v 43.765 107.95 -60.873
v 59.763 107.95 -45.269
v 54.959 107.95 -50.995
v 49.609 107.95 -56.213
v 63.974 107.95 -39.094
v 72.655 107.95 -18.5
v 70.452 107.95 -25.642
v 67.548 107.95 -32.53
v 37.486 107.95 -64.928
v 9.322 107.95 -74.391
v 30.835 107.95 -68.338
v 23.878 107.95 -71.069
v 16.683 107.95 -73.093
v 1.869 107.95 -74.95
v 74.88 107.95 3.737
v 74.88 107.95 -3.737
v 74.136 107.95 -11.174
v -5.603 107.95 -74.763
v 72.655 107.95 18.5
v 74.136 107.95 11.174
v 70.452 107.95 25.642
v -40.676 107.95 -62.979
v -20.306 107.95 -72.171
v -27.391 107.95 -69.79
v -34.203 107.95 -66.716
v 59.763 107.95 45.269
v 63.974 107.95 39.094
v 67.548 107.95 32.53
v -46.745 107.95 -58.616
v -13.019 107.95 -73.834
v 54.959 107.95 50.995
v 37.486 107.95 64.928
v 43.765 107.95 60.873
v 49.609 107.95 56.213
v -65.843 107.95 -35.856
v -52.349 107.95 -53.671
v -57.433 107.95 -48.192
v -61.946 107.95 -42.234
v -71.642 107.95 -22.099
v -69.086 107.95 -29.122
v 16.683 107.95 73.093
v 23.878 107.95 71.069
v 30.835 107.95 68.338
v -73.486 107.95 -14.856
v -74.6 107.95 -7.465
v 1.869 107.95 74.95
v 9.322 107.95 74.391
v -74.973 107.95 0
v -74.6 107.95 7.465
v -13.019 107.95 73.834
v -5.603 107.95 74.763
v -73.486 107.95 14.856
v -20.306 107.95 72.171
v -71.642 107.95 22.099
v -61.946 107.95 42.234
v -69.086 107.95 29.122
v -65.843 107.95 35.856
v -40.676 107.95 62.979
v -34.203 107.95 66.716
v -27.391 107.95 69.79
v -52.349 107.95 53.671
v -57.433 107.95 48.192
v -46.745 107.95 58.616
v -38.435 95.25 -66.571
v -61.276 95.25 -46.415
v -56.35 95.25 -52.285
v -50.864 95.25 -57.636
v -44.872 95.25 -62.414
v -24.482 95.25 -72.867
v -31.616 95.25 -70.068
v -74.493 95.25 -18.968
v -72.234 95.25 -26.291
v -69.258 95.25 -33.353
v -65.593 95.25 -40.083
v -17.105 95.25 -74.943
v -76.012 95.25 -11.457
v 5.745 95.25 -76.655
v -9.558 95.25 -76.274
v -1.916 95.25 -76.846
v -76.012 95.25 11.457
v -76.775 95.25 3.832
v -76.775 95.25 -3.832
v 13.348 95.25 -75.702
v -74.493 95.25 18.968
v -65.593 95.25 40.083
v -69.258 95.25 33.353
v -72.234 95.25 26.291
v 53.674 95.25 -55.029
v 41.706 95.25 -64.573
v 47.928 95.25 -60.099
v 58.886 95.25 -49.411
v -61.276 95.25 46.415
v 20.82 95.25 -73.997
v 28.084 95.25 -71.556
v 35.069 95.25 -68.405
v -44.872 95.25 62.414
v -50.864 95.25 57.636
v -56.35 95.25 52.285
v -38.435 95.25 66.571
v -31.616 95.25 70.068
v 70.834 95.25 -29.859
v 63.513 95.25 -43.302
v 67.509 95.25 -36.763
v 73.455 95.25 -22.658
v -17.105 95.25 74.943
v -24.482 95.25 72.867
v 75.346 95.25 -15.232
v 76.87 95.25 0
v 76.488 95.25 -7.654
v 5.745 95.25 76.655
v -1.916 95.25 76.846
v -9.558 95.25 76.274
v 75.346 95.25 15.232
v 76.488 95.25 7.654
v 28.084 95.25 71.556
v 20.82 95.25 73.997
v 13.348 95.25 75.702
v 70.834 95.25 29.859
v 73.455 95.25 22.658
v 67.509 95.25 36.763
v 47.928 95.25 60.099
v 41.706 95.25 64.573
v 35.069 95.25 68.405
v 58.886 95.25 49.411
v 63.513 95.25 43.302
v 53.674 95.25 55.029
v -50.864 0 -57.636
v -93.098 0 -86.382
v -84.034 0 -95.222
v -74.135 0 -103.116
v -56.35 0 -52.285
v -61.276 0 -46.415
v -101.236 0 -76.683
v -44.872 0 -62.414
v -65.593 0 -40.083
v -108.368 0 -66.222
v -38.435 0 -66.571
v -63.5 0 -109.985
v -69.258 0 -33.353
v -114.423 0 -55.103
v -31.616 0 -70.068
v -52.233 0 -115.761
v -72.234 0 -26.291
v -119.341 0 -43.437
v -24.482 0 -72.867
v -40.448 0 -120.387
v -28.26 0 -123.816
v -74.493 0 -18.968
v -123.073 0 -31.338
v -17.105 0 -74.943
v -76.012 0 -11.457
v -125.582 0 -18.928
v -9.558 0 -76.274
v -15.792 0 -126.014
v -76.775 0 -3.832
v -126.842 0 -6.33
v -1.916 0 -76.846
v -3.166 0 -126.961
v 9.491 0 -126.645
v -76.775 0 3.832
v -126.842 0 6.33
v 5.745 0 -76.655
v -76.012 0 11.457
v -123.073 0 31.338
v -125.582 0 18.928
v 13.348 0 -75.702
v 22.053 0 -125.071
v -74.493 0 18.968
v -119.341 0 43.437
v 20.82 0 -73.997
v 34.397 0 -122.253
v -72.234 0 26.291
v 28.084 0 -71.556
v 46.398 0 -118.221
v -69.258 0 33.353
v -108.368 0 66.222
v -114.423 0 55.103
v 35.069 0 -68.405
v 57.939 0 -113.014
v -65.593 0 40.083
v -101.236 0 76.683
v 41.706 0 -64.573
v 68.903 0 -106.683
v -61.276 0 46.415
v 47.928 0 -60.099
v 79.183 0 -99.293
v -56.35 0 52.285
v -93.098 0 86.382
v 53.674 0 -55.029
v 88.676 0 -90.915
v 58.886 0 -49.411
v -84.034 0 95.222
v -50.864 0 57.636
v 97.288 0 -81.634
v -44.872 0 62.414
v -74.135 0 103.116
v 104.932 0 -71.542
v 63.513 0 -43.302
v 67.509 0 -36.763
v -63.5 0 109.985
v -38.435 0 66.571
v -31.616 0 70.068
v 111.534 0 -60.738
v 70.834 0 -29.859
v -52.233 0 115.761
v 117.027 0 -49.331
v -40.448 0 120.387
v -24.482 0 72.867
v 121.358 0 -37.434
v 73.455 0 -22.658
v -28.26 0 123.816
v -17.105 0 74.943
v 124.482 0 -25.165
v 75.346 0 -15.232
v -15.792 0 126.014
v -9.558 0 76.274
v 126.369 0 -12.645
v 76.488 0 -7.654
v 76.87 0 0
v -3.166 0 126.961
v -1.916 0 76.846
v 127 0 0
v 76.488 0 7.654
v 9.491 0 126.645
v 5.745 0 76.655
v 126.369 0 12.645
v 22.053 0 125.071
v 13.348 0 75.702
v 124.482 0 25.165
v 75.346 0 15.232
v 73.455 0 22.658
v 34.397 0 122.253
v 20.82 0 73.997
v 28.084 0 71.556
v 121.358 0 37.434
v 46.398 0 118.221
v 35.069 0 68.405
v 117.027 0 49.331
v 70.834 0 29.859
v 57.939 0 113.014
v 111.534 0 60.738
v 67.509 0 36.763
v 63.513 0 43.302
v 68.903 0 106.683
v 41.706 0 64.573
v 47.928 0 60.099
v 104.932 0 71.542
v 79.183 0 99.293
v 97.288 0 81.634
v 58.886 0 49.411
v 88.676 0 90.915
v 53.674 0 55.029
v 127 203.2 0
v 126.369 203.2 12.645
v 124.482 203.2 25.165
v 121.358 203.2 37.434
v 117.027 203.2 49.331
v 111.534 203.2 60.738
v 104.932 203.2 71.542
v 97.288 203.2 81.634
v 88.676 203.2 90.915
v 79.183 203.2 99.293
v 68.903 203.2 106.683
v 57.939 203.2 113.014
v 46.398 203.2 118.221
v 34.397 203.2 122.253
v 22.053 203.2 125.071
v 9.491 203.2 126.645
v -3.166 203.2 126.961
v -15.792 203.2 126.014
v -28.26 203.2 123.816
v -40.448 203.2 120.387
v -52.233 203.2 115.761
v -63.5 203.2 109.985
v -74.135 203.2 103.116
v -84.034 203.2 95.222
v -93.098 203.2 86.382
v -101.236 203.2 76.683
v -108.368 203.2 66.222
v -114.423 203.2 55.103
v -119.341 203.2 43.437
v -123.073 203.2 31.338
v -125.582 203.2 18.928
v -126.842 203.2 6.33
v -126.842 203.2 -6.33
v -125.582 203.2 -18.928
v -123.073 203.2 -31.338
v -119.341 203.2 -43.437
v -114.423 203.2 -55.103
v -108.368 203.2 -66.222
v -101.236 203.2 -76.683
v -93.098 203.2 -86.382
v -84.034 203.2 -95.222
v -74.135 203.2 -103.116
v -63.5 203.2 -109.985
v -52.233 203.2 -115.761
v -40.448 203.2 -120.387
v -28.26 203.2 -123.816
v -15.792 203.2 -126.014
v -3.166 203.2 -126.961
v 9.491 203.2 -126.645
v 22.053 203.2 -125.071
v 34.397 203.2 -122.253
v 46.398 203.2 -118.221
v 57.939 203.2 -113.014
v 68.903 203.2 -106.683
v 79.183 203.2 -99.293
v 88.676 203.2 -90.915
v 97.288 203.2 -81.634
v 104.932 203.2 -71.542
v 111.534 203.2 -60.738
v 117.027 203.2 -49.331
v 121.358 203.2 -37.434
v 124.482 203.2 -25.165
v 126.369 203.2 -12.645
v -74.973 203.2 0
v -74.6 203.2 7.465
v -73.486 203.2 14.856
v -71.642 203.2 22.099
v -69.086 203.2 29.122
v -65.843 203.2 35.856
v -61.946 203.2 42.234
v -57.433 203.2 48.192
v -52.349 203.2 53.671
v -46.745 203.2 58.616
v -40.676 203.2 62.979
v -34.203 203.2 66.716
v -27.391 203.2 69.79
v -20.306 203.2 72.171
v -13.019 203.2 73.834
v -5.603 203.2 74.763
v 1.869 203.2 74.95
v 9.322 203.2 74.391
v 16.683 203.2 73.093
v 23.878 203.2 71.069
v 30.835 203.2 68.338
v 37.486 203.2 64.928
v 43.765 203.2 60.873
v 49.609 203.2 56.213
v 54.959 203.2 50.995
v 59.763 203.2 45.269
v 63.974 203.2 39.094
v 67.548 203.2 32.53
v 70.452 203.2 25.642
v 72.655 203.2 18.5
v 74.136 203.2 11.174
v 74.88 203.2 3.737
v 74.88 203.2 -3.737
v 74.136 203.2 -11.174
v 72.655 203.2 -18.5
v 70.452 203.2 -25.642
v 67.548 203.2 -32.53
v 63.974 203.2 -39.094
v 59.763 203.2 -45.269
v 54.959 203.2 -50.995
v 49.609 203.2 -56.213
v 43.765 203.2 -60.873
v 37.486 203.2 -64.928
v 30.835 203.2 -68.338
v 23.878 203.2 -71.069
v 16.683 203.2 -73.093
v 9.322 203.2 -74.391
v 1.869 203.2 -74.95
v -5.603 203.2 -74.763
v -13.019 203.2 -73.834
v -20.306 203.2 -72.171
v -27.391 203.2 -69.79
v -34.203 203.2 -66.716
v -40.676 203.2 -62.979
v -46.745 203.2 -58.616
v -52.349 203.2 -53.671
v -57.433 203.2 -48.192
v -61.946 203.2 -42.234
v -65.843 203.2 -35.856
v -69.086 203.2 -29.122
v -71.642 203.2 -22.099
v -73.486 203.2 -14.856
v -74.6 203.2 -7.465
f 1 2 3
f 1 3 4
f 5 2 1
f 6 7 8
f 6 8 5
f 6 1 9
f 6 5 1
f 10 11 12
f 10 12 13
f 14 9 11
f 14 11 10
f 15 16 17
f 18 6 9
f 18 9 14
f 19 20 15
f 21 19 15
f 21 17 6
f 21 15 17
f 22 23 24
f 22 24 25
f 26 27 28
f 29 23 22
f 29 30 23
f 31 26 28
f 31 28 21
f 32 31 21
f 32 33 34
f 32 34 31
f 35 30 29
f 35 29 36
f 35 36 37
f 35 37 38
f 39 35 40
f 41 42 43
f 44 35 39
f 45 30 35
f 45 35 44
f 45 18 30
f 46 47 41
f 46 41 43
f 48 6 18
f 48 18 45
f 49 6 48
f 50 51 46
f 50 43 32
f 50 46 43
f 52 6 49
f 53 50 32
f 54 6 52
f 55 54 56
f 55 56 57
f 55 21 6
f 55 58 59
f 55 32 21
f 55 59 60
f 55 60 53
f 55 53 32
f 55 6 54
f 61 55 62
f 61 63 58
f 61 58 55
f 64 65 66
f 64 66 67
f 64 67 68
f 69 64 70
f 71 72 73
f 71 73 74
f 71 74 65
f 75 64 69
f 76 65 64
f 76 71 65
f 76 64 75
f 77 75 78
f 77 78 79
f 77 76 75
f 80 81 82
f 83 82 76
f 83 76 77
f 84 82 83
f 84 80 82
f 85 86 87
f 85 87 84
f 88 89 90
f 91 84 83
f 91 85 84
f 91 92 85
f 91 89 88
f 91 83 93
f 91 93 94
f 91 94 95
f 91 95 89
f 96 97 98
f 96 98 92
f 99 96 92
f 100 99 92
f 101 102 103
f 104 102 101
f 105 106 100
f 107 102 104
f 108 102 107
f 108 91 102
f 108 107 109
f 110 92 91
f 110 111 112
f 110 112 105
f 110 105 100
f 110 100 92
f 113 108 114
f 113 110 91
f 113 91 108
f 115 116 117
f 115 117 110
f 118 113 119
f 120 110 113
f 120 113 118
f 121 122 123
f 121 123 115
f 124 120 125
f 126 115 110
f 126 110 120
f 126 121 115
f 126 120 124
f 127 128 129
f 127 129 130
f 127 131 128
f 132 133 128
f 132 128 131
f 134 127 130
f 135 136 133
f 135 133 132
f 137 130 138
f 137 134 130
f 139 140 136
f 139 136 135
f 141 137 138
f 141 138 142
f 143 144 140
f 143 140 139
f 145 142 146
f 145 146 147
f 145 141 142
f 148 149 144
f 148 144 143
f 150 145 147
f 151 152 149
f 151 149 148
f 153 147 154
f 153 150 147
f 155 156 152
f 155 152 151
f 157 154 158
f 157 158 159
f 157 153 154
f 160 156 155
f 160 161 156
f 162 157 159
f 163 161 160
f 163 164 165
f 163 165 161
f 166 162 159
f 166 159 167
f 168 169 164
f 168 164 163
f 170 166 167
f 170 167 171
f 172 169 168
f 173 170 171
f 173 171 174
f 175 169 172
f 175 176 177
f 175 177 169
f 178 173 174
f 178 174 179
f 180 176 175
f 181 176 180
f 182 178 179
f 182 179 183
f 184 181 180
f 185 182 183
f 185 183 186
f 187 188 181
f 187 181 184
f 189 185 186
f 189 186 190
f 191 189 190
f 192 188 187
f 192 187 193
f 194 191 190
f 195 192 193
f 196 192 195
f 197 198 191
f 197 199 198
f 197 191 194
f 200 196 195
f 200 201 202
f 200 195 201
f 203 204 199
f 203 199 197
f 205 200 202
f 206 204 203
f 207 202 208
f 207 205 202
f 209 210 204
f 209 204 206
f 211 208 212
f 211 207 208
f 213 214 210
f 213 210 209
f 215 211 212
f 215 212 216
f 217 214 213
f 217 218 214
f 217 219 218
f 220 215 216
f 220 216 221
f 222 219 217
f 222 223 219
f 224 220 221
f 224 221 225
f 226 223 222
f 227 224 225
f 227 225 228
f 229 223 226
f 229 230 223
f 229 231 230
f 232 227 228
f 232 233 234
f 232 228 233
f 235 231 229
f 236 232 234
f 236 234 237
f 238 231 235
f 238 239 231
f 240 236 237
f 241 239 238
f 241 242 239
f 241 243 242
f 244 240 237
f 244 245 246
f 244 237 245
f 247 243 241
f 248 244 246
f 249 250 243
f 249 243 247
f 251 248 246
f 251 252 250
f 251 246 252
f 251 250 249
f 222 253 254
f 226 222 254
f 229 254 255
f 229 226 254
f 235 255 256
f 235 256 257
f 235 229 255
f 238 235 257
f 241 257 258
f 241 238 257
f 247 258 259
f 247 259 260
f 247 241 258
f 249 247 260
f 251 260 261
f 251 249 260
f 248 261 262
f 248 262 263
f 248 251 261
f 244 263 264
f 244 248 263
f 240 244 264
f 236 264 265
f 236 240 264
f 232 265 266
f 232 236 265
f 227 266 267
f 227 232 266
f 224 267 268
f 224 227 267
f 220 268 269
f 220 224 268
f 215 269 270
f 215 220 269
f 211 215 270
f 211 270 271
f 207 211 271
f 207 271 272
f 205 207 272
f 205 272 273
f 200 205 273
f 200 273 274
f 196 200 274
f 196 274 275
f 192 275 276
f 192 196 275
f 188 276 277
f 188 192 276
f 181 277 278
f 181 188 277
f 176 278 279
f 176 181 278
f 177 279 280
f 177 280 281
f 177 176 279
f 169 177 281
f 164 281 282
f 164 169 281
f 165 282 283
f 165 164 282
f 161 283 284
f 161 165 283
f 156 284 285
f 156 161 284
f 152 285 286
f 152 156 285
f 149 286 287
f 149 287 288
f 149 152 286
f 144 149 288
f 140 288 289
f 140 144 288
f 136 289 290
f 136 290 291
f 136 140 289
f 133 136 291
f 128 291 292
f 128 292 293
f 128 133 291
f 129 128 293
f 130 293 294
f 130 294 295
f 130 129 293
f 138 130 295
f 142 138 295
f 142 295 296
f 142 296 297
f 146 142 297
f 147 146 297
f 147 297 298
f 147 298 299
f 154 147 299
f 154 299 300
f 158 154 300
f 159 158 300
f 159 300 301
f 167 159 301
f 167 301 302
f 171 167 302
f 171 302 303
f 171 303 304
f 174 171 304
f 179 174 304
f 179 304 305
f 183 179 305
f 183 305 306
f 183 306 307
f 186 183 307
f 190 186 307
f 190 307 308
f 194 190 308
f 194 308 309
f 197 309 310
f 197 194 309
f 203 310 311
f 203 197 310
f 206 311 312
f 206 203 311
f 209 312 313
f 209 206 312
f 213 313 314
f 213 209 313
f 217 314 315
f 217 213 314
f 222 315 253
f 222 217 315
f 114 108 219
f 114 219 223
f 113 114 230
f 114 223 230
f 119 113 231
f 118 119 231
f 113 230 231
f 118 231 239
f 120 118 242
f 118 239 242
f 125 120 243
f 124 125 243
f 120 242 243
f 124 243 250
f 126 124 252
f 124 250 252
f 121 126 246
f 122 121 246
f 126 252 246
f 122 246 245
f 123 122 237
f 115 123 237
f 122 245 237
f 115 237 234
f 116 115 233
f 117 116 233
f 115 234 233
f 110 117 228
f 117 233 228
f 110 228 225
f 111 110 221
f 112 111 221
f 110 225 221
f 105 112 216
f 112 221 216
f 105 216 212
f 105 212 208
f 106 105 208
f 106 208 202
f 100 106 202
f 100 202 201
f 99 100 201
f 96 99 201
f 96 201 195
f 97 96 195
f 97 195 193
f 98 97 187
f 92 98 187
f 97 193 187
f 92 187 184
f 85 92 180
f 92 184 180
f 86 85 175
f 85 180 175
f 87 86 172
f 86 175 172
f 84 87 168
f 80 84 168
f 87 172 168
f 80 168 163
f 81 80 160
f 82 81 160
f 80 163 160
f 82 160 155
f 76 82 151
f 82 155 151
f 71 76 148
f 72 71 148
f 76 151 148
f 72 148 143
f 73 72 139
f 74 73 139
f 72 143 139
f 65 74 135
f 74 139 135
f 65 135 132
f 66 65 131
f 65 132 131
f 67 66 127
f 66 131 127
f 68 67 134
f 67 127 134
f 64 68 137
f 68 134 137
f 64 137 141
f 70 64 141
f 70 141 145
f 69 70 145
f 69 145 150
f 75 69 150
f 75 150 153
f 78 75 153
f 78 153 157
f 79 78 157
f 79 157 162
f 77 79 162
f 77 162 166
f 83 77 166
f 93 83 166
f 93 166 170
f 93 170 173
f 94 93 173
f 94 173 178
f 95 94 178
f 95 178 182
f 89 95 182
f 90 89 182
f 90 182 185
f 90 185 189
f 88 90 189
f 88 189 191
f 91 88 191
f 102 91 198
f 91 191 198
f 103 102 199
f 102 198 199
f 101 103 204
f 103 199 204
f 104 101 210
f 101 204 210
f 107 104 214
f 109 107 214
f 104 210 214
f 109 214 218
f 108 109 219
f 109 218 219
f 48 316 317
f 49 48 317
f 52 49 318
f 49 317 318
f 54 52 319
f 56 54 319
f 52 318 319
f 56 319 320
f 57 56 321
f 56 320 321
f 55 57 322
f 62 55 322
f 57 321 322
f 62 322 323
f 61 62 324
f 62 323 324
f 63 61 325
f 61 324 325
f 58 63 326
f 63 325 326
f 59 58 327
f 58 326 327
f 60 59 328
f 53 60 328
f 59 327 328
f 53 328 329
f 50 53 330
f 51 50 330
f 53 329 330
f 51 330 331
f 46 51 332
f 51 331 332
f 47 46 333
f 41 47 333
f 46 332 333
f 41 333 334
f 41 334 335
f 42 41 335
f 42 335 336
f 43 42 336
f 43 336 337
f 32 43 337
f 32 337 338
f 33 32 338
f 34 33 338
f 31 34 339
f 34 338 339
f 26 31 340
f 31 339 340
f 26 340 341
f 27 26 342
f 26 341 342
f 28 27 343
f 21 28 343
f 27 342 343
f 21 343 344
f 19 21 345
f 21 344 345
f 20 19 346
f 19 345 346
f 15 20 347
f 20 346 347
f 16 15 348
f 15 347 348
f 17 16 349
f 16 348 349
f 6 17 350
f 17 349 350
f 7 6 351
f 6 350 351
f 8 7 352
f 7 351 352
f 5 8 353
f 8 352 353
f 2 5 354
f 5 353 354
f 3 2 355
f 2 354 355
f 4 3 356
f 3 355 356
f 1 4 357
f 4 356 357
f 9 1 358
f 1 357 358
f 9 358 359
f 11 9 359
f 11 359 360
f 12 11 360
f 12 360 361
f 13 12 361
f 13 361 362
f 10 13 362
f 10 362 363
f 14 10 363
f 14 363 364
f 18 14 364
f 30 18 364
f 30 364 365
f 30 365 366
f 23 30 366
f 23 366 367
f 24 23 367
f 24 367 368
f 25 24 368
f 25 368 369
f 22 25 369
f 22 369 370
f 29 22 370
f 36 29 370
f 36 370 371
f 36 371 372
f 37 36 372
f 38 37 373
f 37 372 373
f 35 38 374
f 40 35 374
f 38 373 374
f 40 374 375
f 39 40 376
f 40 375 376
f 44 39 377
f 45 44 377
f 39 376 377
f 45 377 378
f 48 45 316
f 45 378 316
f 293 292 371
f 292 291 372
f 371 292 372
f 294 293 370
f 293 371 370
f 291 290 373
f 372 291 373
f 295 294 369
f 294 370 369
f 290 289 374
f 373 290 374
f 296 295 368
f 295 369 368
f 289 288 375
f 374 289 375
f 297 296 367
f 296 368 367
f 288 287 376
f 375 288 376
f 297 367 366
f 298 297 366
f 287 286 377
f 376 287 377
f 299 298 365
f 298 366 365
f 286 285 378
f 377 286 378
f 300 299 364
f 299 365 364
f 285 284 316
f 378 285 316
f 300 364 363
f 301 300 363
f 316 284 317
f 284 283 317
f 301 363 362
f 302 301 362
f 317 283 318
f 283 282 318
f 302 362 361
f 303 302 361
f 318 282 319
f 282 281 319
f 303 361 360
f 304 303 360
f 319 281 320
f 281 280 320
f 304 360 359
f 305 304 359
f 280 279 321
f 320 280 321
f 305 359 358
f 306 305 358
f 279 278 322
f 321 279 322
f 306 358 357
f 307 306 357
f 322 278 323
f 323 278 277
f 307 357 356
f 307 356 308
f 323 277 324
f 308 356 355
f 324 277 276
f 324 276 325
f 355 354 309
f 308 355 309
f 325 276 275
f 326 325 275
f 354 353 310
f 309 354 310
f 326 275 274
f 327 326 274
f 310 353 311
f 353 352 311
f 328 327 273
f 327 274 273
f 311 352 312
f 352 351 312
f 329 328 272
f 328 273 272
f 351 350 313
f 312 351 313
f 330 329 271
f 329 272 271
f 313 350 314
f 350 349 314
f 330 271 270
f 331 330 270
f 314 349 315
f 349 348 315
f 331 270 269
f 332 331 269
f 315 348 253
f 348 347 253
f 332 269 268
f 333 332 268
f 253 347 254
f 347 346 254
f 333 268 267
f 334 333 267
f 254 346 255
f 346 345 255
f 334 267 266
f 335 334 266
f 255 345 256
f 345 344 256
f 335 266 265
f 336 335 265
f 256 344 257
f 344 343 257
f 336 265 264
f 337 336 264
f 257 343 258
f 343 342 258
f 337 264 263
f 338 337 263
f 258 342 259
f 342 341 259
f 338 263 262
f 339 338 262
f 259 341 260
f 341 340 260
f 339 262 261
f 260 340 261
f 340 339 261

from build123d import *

# Parameters (mm, degrees)
F0_R     = 127
F1_DEPTH = 203.2
F2_R     = 76.870137
F3_DEPTH = 95.25
F4_R     = 74.972923
F5_DEPTH = 95.25


with BuildPart() as f1:
    # F0 (on Front) → F1 (new body)
    with BuildSketch(Plane.XZ):
        Circle(F0_R)
    extrude(amount=-F1_DEPTH)

    # F2 (on face) → F3 (cut)
    with BuildSketch(Plane.XZ):
        Circle(F2_R)
    extrude(amount=-F3_DEPTH, mode=Mode.SUBTRACT)

    # F4 (on face) → F5 (cut)
    with BuildSketch(Plane(origin=(0, 203.2, 0), x_dir=(-1, 0, 0), z_dir=(0, 1, 0))):
        Circle(F4_R)
    extrude(amount=-F5_DEPTH, mode=Mode.SUBTRACT)


solid = f1.part
